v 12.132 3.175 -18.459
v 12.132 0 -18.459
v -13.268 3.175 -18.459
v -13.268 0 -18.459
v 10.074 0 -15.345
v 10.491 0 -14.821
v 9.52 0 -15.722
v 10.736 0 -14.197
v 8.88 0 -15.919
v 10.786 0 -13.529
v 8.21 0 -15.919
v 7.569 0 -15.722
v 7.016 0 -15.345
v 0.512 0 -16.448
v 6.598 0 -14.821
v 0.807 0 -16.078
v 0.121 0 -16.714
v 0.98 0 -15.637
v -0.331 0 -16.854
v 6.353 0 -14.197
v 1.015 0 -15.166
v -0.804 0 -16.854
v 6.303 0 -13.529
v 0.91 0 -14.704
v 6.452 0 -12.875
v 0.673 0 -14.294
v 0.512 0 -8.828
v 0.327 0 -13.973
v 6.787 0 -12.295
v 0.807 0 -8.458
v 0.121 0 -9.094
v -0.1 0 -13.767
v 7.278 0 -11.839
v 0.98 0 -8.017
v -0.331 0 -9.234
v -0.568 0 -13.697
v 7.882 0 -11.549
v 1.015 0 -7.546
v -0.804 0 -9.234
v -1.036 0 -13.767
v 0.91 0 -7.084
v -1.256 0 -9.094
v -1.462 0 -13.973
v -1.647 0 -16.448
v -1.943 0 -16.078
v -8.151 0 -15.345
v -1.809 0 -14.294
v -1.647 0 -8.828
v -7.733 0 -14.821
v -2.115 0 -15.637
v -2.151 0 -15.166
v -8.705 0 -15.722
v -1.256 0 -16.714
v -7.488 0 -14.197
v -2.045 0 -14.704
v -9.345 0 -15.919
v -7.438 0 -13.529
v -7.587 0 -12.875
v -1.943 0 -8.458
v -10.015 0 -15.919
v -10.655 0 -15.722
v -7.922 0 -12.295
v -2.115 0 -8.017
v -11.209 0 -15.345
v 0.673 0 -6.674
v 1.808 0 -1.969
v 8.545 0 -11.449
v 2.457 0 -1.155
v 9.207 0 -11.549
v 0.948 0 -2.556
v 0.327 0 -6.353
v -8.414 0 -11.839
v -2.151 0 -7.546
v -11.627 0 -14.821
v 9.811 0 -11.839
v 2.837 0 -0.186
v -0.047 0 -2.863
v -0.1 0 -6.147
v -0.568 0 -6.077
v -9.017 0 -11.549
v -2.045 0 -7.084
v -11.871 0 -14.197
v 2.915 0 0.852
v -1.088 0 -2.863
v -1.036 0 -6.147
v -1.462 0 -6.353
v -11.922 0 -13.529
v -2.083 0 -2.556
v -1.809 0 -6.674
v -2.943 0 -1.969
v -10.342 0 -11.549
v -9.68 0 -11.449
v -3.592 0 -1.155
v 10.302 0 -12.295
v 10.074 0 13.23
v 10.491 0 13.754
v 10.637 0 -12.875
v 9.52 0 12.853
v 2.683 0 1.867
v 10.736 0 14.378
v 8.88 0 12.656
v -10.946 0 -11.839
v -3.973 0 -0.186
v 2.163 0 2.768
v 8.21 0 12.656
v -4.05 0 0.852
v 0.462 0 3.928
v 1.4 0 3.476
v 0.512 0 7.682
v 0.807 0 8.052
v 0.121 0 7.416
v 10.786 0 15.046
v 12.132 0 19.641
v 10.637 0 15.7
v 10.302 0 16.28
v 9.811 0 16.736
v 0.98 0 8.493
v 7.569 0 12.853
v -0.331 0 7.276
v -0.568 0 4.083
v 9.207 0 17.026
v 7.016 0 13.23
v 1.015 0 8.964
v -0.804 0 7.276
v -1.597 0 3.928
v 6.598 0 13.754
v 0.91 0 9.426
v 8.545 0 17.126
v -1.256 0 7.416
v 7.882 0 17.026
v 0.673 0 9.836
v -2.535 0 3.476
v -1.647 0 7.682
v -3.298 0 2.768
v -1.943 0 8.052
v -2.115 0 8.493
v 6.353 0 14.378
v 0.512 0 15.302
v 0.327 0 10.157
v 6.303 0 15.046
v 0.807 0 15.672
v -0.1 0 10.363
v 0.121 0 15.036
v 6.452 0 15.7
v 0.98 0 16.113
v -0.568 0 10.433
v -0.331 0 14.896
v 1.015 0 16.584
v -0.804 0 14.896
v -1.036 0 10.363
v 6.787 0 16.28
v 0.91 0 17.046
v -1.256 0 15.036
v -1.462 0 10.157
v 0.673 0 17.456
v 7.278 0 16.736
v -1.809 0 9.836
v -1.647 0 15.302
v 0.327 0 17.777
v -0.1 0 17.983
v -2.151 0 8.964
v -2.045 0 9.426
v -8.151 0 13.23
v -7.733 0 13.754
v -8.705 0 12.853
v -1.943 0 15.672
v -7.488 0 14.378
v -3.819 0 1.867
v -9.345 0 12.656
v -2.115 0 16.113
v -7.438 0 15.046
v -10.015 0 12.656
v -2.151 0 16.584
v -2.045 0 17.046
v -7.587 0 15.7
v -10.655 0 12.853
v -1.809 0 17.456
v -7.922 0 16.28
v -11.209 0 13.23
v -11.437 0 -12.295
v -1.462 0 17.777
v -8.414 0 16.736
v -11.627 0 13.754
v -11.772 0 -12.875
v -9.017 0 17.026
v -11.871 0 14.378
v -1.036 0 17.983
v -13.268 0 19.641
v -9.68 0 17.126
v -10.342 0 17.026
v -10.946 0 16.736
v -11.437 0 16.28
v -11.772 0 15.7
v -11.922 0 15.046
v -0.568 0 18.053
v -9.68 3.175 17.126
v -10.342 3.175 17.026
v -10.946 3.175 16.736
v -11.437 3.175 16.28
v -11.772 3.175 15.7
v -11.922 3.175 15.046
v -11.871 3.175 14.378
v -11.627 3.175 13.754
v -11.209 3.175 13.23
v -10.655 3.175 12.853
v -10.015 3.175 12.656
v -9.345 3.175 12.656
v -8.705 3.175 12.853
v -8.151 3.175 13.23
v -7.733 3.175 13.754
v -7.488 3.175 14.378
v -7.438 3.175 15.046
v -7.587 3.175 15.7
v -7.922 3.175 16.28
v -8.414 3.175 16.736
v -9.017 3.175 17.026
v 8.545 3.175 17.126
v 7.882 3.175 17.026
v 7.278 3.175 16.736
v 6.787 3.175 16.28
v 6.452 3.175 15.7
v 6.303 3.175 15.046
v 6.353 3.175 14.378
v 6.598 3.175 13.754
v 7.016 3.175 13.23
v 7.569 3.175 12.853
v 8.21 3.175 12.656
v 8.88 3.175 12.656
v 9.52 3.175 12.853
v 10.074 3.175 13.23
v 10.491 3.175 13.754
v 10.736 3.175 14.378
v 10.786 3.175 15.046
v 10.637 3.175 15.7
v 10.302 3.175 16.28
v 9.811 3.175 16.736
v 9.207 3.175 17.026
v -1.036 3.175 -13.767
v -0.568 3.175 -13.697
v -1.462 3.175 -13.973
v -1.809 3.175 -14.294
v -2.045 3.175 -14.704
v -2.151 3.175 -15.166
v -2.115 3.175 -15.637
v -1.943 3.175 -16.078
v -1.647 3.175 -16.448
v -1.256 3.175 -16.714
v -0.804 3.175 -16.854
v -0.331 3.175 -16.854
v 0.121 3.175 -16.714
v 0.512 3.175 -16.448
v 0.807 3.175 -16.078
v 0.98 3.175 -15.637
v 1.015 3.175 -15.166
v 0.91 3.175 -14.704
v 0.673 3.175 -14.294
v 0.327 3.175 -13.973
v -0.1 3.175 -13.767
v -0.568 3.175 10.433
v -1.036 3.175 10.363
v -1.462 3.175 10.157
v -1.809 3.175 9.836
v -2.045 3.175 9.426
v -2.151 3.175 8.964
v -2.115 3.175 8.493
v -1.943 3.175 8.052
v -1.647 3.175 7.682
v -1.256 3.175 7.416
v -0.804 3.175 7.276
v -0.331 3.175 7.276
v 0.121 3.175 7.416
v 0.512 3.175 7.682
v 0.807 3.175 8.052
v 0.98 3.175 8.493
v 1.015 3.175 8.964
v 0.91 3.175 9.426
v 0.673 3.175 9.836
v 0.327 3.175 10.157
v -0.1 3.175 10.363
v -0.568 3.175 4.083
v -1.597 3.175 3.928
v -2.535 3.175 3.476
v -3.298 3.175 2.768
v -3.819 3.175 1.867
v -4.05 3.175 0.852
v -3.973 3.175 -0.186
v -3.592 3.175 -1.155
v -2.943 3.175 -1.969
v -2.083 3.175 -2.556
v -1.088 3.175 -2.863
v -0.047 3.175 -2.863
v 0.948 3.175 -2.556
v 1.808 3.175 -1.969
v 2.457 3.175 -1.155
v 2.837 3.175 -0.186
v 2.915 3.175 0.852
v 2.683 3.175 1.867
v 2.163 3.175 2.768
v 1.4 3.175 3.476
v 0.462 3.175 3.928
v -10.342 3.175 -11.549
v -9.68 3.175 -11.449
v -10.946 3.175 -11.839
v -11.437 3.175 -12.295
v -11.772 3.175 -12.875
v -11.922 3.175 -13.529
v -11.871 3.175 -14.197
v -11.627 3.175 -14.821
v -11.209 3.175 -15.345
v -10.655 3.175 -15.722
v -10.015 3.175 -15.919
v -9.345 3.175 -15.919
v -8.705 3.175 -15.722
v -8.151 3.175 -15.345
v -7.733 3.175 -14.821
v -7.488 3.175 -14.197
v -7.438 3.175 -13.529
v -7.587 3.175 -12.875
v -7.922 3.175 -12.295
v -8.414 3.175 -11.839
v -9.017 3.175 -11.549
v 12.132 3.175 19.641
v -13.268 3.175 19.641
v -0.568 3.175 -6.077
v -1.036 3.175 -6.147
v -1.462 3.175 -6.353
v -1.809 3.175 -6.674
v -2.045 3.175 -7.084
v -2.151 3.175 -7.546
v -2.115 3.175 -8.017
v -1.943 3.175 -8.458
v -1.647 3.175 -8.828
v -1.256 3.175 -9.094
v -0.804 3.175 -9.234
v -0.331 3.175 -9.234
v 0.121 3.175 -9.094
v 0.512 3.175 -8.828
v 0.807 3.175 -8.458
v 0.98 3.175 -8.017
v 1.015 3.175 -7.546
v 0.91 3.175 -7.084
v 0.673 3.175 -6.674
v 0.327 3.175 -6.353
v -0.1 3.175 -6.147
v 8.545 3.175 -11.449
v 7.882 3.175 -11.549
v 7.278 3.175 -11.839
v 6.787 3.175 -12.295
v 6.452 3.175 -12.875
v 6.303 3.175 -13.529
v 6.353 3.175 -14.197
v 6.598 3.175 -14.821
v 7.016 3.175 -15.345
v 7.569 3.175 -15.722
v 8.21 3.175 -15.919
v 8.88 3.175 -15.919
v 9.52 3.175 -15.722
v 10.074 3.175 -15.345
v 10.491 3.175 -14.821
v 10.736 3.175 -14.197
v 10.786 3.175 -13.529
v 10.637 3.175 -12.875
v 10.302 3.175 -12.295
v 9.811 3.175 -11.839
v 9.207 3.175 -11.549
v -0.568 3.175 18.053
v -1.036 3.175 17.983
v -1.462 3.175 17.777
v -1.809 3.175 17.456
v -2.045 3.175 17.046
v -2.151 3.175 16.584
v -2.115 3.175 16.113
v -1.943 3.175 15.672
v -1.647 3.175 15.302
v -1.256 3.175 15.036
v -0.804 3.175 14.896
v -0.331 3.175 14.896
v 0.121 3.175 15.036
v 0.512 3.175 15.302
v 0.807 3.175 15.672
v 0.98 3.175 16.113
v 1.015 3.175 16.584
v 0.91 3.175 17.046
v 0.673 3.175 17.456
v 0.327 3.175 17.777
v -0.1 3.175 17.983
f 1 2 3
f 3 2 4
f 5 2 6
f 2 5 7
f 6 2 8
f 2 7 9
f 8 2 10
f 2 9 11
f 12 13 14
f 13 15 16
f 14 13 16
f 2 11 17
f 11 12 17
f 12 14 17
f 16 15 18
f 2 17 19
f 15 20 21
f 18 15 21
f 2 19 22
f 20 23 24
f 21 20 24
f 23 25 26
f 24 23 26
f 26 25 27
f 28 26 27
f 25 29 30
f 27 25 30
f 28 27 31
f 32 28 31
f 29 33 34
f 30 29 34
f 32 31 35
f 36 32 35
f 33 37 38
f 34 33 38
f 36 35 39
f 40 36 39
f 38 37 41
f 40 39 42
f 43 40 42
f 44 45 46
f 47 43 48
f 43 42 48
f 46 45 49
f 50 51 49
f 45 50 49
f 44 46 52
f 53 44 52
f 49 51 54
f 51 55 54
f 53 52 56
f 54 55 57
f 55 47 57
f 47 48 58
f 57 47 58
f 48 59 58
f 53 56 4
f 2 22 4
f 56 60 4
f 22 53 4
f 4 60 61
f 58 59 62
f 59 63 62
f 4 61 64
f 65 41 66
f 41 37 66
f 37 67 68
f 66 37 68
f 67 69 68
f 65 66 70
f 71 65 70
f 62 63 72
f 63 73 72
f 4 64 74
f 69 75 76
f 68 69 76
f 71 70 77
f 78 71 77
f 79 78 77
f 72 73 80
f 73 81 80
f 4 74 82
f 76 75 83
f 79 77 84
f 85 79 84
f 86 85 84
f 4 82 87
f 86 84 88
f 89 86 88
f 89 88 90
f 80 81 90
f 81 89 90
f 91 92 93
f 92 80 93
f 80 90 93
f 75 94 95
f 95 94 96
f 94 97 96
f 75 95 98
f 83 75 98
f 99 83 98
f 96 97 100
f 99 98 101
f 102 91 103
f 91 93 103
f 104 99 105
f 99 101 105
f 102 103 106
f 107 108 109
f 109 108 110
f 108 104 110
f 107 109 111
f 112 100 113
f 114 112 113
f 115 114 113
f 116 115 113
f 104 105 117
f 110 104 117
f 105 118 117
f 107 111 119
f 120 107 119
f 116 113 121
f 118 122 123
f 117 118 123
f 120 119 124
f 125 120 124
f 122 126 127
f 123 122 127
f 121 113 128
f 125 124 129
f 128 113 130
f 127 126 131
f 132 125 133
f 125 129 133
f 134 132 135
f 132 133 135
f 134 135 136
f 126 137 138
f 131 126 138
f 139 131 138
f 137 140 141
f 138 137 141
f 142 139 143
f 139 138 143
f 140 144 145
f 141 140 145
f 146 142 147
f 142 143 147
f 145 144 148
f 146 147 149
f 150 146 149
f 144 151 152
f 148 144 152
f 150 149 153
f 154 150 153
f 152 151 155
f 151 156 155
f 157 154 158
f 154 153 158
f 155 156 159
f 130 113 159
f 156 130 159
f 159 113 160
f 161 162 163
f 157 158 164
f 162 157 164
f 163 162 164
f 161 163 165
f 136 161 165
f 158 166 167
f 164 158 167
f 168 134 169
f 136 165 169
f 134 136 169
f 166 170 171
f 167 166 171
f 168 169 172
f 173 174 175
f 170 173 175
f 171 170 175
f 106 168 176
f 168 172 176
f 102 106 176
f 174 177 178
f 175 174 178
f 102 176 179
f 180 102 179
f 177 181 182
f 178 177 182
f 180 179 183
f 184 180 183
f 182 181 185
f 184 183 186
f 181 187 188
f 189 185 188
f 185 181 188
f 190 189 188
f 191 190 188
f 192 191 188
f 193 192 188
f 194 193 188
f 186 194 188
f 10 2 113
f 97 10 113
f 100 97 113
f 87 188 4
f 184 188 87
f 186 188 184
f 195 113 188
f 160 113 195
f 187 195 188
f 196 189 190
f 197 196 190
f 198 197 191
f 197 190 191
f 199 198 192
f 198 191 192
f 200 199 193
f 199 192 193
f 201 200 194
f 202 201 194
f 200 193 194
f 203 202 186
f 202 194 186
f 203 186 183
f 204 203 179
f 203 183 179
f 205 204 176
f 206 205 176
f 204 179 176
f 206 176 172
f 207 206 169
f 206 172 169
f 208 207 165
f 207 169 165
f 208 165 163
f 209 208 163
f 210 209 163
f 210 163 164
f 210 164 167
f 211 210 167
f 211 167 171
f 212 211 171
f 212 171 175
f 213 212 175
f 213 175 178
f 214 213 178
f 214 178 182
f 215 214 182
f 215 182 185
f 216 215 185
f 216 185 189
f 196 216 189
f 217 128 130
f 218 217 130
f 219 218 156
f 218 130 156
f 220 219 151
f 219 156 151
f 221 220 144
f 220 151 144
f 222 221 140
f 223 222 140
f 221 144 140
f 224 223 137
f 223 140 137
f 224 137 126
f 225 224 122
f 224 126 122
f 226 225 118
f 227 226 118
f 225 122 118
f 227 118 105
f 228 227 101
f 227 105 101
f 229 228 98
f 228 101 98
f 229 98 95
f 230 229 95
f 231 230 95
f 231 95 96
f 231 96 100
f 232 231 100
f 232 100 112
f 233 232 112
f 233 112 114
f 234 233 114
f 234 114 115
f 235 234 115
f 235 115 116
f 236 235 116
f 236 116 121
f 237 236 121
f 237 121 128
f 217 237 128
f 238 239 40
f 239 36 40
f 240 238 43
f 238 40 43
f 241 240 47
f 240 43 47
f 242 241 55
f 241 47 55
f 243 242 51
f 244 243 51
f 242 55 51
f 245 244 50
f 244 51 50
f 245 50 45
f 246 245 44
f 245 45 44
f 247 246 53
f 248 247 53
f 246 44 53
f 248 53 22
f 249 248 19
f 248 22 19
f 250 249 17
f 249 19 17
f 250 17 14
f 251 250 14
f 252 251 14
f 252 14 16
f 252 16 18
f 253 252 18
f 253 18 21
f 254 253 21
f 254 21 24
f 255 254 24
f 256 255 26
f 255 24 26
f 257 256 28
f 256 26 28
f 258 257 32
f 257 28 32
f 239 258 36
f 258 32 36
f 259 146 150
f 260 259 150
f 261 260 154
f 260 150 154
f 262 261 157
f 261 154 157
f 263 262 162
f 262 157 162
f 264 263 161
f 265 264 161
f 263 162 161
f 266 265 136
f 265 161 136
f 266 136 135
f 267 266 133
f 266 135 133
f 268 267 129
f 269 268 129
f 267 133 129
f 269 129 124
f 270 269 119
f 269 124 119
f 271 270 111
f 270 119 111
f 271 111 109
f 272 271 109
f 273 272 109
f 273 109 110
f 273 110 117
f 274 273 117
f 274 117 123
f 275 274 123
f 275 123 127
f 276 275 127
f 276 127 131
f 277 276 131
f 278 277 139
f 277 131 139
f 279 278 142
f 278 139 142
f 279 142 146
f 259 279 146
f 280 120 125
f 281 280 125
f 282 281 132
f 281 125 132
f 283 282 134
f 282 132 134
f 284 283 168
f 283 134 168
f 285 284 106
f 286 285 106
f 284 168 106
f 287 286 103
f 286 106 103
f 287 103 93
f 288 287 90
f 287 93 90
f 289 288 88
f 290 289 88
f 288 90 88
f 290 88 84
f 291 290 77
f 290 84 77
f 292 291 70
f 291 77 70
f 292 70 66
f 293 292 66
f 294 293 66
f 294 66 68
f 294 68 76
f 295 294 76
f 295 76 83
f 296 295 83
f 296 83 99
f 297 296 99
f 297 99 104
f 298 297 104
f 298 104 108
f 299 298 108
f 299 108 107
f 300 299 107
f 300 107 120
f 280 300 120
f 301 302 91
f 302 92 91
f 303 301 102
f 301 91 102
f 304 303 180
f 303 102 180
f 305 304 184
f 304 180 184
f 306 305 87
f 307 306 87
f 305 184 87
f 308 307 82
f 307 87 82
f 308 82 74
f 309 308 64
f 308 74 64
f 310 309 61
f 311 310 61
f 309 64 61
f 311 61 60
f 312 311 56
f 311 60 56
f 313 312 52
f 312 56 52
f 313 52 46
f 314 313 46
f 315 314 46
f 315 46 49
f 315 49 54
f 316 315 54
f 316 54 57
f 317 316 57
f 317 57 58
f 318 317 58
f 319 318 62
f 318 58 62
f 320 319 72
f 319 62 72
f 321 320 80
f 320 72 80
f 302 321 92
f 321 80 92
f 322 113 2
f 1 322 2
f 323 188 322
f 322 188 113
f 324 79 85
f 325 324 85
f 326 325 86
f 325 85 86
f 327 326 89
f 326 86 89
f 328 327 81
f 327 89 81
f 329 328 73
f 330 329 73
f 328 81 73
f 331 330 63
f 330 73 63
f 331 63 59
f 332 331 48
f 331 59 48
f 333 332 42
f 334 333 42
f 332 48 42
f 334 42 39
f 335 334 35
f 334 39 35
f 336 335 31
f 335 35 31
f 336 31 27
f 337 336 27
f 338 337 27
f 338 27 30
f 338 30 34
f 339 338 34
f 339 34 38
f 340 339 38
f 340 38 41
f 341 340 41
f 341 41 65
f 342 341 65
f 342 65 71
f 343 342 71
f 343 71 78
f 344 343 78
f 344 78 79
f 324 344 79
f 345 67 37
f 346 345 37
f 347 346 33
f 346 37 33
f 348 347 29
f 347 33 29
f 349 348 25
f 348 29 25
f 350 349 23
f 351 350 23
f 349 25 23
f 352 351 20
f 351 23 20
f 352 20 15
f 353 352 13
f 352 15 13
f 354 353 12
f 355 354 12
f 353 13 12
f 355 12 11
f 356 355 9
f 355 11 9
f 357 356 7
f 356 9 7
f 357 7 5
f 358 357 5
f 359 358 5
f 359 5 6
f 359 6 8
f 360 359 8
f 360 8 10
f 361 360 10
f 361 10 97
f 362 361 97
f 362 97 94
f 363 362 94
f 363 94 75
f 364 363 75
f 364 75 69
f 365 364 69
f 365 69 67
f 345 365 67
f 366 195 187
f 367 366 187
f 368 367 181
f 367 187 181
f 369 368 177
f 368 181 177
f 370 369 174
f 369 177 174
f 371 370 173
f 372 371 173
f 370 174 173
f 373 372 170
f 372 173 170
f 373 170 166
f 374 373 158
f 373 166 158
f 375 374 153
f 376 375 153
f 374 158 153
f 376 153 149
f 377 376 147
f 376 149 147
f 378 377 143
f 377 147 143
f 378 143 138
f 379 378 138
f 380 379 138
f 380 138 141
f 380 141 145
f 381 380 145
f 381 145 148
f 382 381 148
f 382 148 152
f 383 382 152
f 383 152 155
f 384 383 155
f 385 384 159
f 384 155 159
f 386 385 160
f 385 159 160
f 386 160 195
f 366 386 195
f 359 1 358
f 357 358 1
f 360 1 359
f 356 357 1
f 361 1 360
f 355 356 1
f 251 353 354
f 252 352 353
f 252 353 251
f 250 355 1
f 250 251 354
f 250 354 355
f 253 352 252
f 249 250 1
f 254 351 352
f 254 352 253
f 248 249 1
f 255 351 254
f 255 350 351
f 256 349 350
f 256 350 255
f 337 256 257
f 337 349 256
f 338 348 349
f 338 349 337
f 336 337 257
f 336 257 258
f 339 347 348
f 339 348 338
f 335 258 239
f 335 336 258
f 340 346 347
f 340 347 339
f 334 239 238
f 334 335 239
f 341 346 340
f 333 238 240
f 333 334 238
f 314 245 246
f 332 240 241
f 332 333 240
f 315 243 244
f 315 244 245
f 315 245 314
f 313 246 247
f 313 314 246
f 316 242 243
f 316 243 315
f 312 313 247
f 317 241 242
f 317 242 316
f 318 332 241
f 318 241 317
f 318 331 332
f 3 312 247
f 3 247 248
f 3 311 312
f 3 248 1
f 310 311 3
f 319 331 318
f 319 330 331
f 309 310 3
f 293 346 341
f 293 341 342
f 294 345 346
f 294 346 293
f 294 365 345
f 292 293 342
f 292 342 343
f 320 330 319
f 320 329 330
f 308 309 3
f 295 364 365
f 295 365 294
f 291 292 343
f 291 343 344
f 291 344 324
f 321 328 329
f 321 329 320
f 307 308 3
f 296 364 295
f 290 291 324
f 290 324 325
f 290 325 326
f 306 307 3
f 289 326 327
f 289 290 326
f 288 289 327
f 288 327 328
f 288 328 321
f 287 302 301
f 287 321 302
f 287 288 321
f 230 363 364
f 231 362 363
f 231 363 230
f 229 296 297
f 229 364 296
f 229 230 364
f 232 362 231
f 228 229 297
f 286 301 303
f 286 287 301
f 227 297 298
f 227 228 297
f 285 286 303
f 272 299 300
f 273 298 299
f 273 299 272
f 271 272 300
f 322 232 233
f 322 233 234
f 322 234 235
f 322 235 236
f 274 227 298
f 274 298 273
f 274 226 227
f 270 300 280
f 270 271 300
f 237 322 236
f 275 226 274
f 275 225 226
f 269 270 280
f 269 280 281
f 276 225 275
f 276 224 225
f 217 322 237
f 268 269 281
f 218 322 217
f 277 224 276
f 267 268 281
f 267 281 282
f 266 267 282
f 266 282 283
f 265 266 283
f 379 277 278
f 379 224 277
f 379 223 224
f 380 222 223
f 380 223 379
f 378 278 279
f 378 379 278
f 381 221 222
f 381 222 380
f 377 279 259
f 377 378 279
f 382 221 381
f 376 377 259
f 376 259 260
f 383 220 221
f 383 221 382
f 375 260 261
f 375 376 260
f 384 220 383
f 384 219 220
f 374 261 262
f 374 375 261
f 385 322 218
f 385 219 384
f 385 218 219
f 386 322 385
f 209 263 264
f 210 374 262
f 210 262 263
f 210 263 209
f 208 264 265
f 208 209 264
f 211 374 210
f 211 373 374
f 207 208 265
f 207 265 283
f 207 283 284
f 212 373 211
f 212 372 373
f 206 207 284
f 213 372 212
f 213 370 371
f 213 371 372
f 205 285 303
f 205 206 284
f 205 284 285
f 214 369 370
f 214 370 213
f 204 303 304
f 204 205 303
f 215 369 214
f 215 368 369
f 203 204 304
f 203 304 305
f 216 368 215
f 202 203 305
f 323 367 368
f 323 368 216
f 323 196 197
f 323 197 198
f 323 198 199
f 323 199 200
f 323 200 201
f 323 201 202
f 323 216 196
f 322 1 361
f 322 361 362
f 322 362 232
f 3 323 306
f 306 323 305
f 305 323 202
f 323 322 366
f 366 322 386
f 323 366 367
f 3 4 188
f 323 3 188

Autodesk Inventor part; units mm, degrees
ref_plane "YZ Plane" through (0, 0, 0) normal (1, 0, 0) x (0, 1, 0)
ref_plane "XZ Plane" through (0, 0, 0) normal (0, 1, 0) x (-1, 0, 0)
ref_plane "XY Plane" through (0, 0, 0) normal (0, 0, 1) x (1, 0, 0)
sketch "Sketch1" plane through (0, 0, 0) normal (0, 1, 0) x (-1, 0, 0)
  line L0 (13.2677, 19.6408) -> (-12.1323, 19.6408)
  line L1 (-12.1323, 19.6408) -> (-12.1323, -18.4592)
  line L2 (-12.1323, -18.4592) -> (13.2677, -18.4592)
  line L3 (13.2677, -18.4592) -> (13.2677, 19.6408)
  point P0 (0, 0)
  dimension "d0" = 25.4
  dimension "d1" = 38.1
extrude "Extrusion1" add sketch "Sketch1" along normal blind 3.175
hole "Hole1" at (-9.6799, 3.175, 14.8783) direction (0, -1, 0) diameter 4.4958 depth 3.175 clearance for "Flat Head Machine Screw (82)" size "#8" standard "Ansi Unified Screw Threads"
hole "Hole2" at (8.5446, 3.175, 14.8783) direction (0, -1, 0) diameter 4.4958 depth 3.175 clearance for "Flat Head Machine Screw (82)" size "#8" standard "Ansi Unified Screw Threads"
hole "Hole3" at (-9.6799, 3.175, -13.6967) direction (0, -1, 0) diameter 4.4958 depth 3.175 clearance for "Flat Head Machine Screw (82)" size "#8" standard "Ansi Unified Screw Threads"
hole "Hole4" at (8.5446, 3.175, -13.6967) direction (0, -1, 0) diameter 4.4958 depth 3.175 clearance for "Flat Head Machine Screw (82)" size "#8" standard "Ansi Unified Screw Threads"
hole "Hole6" at (-0.5677, 3.175, 8.8458) direction (0, -1, 0) diameter 3.175 depth 3.175
hole "Hole5" at (-0.5677, 3.175, -7.6642) direction (0, -1, 0) diameter 3.175 depth 3.175
hole "Hole7" at (-0.5677, 3.175, 0.5908) direction (0, -1, 0) diameter 6.985 depth 3.175
hole "Hole8" at (-0.5677, 3.175, 16.4658) direction (0, -1, 0) diameter 3.175 depth 3.175 tip angle 118
hole "Hole9" at (-0.5677, 3.175, -15.2842) direction (0, -1, 0) diameter 3.175 depth 3.175 tip angle 118
properties part number "Shield_3" material "Stainless Steel"
